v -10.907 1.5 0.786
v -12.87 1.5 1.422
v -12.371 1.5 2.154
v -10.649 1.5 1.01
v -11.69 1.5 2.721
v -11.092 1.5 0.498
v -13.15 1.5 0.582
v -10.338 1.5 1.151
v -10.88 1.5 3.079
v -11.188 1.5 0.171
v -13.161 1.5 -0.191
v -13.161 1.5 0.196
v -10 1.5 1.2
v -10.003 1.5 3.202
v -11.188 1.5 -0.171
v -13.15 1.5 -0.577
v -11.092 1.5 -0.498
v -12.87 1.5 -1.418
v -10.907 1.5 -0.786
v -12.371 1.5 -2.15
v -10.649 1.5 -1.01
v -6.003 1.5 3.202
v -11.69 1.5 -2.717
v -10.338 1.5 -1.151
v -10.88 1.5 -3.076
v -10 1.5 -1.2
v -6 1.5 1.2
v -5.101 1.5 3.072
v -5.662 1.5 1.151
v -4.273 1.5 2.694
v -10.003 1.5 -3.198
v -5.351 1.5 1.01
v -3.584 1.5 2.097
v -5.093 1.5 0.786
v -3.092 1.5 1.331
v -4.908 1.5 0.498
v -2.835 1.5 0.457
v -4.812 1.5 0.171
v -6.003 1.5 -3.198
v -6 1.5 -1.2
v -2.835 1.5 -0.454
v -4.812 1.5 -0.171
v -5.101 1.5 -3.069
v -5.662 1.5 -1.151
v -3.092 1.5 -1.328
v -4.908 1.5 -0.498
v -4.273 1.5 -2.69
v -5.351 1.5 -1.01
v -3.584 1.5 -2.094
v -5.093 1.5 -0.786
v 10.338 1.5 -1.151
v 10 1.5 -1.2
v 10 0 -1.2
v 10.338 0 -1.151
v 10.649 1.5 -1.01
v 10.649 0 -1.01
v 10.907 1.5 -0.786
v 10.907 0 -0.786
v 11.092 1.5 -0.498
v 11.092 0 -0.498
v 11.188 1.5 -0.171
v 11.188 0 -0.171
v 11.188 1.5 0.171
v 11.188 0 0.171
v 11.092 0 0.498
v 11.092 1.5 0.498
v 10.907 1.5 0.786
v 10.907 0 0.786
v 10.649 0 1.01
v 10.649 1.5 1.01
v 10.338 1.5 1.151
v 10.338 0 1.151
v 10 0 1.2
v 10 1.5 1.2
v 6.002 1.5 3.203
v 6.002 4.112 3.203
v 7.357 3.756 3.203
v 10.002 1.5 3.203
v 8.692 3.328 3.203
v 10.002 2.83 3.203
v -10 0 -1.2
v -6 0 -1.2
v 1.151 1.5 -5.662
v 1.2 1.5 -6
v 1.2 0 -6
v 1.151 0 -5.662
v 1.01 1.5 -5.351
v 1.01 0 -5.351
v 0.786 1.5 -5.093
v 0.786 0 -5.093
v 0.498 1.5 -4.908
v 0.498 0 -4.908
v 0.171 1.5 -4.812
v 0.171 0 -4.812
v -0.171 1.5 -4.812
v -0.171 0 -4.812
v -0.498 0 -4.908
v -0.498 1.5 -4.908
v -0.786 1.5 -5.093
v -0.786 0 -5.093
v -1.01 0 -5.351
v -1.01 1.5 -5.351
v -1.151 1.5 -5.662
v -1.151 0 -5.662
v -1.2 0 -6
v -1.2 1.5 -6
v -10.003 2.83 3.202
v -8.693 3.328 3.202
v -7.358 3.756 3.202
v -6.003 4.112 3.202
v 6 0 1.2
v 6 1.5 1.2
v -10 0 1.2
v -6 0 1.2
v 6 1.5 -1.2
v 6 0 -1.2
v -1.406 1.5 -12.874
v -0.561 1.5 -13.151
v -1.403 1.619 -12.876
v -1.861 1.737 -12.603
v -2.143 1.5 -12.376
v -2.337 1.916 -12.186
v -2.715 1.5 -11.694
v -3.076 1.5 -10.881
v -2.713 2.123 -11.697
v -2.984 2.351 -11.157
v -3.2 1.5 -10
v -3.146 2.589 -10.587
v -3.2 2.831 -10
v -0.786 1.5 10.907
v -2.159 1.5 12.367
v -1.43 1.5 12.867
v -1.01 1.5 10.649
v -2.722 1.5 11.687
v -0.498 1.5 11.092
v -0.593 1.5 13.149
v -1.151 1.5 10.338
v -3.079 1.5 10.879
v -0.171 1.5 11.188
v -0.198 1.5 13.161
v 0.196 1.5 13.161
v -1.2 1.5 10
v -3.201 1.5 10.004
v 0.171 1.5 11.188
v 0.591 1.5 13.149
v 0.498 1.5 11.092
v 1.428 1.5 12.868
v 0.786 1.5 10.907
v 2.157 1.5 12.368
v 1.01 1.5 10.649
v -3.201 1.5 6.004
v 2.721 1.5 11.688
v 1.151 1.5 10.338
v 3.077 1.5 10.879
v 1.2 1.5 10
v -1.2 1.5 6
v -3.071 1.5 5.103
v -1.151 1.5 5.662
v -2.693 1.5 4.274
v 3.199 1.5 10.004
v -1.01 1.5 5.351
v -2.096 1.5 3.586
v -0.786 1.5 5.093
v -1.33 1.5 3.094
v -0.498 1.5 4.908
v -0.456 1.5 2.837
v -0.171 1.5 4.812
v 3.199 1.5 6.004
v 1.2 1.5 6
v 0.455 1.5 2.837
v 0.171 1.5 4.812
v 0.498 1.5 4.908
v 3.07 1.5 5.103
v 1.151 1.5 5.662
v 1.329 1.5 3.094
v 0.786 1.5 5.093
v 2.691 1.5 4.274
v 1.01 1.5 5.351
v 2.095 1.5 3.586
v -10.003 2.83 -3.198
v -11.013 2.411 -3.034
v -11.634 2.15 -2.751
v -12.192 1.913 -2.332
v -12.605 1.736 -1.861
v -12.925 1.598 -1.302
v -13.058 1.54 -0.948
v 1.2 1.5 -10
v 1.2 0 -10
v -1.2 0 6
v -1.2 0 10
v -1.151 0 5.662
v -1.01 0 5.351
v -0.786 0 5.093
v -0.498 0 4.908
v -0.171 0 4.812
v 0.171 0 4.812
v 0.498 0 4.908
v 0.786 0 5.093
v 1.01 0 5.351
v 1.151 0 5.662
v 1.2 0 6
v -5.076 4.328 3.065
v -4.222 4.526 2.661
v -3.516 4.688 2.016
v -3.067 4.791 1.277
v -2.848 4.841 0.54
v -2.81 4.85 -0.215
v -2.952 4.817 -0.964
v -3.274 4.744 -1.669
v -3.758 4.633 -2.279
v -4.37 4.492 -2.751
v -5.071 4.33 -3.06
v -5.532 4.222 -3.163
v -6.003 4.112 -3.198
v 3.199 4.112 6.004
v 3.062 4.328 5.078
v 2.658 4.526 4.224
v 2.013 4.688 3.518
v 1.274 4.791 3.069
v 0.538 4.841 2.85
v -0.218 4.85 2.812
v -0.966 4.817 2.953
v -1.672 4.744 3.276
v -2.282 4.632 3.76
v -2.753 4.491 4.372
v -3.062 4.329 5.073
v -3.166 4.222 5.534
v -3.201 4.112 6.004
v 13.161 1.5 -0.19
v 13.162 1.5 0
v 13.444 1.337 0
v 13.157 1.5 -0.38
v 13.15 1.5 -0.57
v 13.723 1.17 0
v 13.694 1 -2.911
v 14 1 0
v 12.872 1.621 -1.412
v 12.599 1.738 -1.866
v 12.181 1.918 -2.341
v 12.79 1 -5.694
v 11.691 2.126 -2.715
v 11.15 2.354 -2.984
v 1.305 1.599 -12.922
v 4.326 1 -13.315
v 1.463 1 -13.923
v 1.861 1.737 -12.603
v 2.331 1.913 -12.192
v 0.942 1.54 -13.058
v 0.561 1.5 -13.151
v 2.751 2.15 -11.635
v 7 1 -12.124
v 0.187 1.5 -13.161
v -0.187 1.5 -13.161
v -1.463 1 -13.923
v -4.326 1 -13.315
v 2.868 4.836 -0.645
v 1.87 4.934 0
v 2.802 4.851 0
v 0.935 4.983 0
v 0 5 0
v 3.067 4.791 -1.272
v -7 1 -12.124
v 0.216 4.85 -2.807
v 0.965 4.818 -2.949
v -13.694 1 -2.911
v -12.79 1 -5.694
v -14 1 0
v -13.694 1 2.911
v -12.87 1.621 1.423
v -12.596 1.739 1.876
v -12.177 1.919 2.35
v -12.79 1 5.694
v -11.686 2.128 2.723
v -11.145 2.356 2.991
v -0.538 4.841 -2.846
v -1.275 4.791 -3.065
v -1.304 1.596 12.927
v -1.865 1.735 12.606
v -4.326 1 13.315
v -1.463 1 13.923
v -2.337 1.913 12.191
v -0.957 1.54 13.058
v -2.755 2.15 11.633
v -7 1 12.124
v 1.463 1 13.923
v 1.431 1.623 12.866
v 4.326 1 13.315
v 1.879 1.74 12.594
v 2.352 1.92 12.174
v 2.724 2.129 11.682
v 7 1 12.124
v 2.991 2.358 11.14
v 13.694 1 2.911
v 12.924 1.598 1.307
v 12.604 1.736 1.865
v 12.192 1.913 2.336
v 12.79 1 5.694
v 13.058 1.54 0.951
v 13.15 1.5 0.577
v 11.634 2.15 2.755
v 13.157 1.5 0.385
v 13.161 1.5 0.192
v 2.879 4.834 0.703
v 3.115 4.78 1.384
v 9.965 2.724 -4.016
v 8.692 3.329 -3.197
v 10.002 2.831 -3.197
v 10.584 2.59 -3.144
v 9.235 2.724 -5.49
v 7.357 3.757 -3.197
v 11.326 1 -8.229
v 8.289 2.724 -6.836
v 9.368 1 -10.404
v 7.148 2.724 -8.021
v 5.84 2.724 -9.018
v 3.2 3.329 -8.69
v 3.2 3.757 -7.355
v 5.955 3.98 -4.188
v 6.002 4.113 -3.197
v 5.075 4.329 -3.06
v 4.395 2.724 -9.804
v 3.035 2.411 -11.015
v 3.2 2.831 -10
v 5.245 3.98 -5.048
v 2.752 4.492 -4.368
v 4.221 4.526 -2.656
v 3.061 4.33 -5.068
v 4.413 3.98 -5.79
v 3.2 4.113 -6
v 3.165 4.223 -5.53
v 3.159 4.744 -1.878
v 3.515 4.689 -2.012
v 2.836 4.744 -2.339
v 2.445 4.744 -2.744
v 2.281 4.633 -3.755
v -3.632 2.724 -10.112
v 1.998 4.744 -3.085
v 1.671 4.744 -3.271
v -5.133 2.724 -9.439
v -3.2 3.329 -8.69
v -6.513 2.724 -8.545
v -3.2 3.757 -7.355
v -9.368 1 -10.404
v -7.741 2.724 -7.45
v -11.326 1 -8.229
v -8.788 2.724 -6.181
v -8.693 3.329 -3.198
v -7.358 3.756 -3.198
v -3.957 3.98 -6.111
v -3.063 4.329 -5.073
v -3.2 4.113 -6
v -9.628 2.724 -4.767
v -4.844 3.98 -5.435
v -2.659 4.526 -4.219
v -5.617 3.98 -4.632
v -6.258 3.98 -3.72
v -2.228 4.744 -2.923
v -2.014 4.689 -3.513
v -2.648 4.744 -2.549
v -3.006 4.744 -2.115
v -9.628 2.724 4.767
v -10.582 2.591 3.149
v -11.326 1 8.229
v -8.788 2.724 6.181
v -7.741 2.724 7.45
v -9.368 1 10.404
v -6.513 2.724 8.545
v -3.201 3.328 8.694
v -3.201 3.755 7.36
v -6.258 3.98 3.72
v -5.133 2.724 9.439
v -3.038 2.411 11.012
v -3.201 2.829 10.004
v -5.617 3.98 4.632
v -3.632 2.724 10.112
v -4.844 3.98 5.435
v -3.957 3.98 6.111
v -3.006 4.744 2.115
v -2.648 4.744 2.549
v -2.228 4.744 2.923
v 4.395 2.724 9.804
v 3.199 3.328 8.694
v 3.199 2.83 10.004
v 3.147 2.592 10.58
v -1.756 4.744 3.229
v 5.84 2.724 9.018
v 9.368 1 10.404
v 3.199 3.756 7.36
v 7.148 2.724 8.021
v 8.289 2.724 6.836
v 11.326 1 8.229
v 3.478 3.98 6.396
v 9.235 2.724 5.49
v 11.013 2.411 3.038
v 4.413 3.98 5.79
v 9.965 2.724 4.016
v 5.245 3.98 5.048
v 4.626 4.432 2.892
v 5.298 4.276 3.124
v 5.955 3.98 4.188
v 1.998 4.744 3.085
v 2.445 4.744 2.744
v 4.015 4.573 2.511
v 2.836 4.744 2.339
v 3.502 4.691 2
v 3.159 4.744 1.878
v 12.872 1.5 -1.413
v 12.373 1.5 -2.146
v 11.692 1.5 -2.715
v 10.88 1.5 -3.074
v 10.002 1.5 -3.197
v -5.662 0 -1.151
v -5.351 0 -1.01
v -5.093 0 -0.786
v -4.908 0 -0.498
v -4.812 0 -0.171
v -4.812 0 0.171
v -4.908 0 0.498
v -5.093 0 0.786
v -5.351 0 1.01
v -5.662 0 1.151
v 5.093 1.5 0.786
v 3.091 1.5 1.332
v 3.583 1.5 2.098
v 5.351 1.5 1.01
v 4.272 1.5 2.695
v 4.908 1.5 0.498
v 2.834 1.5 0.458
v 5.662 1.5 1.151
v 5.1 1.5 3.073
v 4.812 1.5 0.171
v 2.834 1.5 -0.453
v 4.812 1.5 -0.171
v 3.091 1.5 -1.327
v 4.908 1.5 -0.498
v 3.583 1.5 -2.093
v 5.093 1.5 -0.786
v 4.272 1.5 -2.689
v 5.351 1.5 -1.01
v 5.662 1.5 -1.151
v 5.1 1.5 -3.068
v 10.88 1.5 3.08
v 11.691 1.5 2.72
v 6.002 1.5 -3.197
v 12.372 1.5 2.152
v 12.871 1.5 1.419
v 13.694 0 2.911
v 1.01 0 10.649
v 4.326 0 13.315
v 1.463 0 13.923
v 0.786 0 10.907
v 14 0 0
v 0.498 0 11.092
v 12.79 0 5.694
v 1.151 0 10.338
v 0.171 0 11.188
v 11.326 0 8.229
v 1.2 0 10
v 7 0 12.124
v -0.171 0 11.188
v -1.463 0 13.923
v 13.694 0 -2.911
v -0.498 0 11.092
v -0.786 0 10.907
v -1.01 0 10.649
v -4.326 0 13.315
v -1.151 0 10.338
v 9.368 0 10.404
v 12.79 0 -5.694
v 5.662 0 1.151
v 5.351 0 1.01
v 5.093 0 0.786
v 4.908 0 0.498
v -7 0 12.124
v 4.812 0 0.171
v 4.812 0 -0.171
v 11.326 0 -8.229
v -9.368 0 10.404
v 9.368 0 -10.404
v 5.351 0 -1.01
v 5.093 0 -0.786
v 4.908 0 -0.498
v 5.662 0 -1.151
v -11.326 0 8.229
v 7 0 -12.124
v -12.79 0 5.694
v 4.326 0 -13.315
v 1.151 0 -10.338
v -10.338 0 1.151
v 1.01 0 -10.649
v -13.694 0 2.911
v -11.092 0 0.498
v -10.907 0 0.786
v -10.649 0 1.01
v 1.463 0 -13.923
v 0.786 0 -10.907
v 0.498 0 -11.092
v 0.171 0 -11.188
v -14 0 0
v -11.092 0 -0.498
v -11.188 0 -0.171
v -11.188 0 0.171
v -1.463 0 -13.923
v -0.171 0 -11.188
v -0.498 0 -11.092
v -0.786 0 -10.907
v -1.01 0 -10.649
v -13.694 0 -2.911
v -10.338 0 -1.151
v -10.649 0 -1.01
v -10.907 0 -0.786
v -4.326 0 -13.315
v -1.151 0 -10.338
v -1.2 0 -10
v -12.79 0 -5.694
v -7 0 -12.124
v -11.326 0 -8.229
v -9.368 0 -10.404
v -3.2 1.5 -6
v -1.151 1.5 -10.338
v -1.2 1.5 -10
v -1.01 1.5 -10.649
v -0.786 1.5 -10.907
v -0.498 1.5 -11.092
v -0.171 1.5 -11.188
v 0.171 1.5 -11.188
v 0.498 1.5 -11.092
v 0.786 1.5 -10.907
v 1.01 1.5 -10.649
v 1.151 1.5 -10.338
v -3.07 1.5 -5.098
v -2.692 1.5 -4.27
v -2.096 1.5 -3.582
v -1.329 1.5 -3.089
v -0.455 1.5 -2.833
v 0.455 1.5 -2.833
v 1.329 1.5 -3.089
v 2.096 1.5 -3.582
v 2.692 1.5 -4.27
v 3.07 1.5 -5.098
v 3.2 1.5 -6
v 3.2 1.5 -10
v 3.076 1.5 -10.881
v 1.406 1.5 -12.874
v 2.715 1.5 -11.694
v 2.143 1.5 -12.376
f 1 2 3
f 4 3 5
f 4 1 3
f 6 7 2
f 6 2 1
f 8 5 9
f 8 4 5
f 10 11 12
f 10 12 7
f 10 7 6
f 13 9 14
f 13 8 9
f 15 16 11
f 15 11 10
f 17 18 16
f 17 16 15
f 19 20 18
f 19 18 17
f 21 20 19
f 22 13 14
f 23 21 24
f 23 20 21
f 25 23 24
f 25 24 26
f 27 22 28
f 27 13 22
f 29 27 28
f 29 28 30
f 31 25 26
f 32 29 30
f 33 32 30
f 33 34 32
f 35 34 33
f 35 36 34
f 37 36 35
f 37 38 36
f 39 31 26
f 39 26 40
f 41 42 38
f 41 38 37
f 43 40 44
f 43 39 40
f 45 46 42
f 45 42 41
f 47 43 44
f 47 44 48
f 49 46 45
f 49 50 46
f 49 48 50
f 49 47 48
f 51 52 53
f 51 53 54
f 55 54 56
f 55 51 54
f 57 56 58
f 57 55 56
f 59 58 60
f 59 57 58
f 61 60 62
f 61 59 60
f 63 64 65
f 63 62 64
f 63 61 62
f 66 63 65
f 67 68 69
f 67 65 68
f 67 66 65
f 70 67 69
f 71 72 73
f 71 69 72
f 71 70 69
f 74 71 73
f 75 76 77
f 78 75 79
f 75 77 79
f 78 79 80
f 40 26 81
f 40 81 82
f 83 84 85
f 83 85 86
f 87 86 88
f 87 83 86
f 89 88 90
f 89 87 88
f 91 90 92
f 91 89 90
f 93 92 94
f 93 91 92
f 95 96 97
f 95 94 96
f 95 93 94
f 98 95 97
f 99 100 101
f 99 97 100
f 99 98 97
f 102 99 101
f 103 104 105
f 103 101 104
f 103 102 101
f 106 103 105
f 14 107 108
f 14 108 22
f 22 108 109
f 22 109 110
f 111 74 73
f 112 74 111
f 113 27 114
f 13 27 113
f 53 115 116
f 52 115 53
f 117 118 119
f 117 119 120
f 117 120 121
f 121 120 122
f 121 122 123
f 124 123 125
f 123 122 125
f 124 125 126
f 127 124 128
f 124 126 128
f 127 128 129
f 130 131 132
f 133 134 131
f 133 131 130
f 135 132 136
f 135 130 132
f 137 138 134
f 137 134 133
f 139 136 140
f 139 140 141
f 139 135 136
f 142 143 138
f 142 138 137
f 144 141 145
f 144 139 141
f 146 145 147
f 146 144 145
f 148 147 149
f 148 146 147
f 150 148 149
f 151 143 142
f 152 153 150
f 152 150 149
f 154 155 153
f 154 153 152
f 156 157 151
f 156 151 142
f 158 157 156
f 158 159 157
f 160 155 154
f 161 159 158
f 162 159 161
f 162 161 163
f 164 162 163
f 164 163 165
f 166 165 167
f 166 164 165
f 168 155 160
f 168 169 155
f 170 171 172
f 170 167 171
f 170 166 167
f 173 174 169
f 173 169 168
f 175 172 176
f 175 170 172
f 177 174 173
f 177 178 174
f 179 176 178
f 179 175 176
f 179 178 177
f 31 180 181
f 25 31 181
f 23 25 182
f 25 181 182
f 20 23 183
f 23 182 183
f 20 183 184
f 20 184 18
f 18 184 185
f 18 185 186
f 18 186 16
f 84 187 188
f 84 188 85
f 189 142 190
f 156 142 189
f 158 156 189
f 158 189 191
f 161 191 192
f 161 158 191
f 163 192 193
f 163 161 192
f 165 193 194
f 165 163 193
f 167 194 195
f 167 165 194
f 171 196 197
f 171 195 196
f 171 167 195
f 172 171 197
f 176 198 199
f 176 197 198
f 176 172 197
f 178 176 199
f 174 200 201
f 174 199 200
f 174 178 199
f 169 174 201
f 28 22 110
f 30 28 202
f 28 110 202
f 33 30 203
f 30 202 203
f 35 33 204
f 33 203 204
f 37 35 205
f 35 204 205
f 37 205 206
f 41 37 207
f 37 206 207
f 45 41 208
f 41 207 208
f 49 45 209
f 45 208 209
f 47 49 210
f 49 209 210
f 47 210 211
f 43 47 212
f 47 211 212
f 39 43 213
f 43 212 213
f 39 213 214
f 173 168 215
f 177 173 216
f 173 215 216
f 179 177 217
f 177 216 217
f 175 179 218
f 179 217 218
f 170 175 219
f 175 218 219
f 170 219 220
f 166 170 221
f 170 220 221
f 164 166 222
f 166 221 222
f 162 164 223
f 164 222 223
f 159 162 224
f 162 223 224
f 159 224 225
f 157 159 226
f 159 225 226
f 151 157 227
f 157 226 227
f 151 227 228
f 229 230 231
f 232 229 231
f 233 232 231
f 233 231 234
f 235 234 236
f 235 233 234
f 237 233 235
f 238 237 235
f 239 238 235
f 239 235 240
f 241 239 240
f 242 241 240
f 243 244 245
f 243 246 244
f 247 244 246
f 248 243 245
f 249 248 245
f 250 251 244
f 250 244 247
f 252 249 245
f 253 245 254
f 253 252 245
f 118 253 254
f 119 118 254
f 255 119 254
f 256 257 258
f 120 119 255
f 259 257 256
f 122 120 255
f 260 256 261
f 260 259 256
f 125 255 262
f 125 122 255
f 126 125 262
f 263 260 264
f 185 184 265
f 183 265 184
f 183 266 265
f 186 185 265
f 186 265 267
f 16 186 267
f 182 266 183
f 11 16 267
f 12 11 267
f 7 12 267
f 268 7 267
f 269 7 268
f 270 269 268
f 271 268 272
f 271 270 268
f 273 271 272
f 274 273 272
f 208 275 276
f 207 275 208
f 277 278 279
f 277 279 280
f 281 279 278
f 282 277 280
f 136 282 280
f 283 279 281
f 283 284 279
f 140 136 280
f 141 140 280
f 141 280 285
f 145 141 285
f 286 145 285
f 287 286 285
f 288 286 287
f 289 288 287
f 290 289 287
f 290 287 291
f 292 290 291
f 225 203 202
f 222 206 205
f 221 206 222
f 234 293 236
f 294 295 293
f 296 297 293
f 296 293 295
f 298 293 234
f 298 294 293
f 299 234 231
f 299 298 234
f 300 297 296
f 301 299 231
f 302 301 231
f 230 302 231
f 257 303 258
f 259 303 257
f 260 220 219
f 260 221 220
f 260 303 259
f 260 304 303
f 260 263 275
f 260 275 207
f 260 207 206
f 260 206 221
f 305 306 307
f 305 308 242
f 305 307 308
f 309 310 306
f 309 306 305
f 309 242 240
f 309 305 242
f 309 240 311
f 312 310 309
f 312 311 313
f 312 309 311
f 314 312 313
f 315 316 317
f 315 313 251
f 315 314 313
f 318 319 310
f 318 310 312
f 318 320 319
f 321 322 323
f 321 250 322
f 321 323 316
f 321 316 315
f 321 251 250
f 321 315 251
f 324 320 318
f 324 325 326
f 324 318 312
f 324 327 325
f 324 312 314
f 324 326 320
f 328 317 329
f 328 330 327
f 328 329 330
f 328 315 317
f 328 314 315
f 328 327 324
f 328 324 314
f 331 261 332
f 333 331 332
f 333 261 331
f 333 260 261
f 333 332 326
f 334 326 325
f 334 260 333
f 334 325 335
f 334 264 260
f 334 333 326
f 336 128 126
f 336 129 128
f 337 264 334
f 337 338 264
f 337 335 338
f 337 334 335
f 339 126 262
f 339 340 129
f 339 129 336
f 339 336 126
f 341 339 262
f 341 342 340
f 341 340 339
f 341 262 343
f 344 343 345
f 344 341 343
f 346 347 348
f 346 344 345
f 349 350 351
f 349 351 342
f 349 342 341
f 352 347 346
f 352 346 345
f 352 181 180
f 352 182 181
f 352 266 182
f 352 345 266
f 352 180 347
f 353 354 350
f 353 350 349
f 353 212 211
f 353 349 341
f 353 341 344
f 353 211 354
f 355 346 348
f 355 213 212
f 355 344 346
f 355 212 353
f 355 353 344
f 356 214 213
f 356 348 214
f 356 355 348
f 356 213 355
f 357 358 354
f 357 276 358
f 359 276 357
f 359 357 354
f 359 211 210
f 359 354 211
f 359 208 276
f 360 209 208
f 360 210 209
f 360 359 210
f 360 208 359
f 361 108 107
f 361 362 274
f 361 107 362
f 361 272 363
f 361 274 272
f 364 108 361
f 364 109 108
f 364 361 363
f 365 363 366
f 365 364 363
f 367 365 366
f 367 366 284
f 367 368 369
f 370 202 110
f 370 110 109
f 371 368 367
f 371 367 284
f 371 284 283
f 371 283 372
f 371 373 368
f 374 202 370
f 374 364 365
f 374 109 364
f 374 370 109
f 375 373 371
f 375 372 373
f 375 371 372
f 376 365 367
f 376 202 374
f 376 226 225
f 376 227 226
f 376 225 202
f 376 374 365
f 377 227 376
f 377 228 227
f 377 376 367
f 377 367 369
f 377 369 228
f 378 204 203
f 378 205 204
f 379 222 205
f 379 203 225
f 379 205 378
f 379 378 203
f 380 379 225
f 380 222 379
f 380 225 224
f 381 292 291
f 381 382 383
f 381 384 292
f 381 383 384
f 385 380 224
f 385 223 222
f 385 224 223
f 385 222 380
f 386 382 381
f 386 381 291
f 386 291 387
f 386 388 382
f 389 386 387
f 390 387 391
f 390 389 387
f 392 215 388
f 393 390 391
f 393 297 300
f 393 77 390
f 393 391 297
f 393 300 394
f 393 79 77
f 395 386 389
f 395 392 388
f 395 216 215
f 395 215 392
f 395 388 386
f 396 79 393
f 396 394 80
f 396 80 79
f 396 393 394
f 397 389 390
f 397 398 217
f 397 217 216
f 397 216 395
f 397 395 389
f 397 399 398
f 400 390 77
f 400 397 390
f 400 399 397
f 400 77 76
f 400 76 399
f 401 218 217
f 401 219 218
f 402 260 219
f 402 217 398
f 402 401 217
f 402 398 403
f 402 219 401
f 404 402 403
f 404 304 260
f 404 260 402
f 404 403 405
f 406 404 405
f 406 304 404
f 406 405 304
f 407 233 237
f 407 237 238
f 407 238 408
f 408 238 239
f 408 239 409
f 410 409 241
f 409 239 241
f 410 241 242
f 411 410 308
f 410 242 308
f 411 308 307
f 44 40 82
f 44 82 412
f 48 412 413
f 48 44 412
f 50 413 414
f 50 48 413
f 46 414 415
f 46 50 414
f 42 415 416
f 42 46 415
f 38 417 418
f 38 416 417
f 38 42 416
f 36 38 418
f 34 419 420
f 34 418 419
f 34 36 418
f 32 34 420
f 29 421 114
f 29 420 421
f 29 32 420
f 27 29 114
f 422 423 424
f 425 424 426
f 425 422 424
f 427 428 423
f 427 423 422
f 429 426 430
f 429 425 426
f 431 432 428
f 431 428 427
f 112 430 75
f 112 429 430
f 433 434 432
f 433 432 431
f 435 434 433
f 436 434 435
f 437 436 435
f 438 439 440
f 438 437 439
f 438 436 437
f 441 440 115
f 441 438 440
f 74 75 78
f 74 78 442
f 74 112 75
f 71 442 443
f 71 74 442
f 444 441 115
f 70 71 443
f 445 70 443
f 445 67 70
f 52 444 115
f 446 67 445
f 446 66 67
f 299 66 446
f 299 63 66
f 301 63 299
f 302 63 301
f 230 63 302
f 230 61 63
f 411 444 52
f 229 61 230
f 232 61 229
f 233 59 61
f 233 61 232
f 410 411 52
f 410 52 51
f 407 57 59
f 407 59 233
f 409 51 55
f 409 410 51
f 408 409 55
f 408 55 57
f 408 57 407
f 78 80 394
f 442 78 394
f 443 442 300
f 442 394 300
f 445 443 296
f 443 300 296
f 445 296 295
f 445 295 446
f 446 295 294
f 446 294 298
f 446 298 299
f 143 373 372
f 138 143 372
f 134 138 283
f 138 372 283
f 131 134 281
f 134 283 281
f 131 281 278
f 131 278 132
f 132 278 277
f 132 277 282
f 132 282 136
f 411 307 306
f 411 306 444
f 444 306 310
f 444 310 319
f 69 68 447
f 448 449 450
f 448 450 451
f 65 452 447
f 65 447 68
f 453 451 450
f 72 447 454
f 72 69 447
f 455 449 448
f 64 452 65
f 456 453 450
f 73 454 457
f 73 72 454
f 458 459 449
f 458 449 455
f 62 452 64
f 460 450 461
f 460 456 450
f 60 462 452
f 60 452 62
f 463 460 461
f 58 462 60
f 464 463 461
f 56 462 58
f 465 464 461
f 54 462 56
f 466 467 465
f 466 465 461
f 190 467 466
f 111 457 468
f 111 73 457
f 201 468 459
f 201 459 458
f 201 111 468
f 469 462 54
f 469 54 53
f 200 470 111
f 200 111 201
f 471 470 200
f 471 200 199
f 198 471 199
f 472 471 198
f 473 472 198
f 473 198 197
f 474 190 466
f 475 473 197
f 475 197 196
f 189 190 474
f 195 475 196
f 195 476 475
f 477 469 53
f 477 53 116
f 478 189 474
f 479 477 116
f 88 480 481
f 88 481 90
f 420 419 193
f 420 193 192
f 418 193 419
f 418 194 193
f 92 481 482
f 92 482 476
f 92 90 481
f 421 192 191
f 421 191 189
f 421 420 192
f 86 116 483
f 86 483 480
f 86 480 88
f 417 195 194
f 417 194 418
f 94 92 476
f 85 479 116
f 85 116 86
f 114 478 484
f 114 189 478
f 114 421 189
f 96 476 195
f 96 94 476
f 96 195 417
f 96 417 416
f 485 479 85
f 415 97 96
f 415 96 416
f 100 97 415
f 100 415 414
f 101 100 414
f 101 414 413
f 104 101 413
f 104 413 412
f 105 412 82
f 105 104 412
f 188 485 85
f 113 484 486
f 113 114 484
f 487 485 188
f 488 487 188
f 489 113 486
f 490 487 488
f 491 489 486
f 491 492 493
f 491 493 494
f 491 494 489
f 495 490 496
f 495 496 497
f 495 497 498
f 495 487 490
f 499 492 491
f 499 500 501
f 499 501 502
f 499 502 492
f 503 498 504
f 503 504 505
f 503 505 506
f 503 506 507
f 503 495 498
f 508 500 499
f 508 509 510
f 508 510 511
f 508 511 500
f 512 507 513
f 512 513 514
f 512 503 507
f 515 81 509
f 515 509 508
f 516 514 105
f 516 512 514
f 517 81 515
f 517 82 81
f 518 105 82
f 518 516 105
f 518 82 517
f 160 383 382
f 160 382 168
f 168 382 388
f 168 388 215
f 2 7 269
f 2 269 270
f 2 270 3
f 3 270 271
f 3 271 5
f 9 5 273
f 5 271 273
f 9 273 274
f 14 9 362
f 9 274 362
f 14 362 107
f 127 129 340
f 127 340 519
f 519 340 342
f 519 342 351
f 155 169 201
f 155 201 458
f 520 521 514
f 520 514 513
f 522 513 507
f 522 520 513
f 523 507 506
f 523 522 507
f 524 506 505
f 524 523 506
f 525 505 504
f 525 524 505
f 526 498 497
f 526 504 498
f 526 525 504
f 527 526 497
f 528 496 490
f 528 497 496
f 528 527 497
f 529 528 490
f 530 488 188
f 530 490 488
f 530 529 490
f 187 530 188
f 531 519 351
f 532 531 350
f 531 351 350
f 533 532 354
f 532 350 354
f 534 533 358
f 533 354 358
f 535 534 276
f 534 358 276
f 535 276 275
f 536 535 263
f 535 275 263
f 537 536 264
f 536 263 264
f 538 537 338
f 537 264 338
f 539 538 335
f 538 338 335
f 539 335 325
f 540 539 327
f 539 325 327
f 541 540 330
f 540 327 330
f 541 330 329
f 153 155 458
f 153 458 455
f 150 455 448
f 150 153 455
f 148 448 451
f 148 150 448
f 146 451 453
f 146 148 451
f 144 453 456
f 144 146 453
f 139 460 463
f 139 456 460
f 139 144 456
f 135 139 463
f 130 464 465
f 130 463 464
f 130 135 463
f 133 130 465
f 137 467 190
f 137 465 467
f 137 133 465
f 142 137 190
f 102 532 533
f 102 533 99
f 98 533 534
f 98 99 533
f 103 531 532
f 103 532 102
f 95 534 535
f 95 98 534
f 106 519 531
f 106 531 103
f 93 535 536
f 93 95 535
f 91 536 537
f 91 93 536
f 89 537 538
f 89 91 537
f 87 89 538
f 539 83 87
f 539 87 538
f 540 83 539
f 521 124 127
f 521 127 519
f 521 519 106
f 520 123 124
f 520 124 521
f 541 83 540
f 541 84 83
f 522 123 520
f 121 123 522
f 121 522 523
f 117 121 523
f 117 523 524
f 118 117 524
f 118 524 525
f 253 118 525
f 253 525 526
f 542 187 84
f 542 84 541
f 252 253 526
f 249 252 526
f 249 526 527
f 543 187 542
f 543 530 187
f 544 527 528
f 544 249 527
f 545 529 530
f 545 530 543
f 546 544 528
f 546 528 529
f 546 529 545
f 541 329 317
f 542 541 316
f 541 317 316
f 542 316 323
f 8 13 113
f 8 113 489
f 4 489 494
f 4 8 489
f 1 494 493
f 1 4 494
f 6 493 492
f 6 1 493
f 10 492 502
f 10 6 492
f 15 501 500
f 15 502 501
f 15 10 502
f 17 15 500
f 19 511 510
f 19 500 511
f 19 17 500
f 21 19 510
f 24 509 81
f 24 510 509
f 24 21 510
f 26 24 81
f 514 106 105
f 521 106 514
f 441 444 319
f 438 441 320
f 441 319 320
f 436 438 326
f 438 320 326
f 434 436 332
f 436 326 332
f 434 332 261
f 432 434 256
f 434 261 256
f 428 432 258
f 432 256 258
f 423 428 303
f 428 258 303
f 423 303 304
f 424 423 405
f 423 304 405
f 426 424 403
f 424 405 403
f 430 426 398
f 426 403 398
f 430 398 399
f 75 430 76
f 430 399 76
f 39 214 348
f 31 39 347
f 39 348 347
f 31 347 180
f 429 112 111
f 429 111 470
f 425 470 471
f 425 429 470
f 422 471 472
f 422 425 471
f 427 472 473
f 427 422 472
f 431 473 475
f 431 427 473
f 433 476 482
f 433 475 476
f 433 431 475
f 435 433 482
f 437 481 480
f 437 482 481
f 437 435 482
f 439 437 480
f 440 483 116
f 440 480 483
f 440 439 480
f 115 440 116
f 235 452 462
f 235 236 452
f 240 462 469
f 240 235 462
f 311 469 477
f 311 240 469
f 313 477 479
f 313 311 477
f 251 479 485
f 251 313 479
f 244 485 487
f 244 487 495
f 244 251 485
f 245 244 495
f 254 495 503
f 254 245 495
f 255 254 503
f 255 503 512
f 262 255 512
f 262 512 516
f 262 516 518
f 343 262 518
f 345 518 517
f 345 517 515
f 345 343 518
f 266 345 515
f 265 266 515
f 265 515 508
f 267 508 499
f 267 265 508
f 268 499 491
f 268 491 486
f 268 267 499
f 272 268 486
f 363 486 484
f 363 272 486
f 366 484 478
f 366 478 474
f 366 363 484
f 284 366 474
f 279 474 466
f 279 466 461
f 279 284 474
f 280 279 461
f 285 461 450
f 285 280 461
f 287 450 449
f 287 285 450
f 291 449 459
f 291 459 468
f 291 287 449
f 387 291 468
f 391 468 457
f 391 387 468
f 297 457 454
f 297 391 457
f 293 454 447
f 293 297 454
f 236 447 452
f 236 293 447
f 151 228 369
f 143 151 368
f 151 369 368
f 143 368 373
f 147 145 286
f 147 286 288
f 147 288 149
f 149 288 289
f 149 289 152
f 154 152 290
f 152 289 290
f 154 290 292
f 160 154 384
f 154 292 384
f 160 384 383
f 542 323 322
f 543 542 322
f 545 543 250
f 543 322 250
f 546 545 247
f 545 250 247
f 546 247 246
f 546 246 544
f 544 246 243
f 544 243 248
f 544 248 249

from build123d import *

# Parameters (mm, degrees)
CUT_EXTRUDE1_DEPTH = 21.420577857
CUT_EXTRUDE2_DEPTH = 3.5


with BuildPart() as part:
    # Sketch1 → Revolve1 (revolve)
    with BuildSketch(Plane.XY, mode=Mode.PRIVATE) as revolve1_sk:
        with BuildLine():
            Line((0, 0), (-14, 0))
            Line((-14, 0), (-14, 1))
            ThreePointArc((-14, 1), (-7.280109889, 3.980384612), (0, 5))
            Line((0, 5), (0, 0))
        make_face()
    revolve(revolve1_sk.sketch.rotate(Axis((0, 0, 0), (0, 1, 0)), 180), axis=Axis((0, 0, 0), (0, 1, 0)))

    # Sketch2 → Cut-Extrude1 (cut, through all)
    with BuildSketch(Plane(origin=(0, 5, 0), x_dir=(1, 0, 0), z_dir=(0, 1, 0))):
        with BuildLine():
            Line((1.2, 10), (1.2, 6))
            ThreePointArc((1.2, 6), (0, 4.8), (-1.2, 6))
            Line((-1.2, 6), (-1.2, 10))
            ThreePointArc((-1.2, 10), (0, 11.2), (1.2, 10))
        make_face()
        with BuildLine():
            Line((10, -1.2), (6, -1.2))
            ThreePointArc((6, -1.2), (4.8, 0), (6, 1.2))
            Line((6, 1.2), (10, 1.2))
            ThreePointArc((10, 1.2), (11.2, 0), (10, -1.2))
        make_face()
        with BuildLine():
            Line((-1.2, -10), (-1.2, -6))
            ThreePointArc((-1.2, -6), (0, -4.8), (1.2, -6))
            Line((1.2, -6), (1.2, -10))
            ThreePointArc((1.2, -10), (0, -11.2), (-1.2, -10))
        make_face()
        with BuildLine():
            Line((-10, 1.2), (-6, 1.2))
            ThreePointArc((-6, 1.2), (-4.8, 0), (-6, -1.2))
            Line((-6, -1.2), (-10, -1.2))
            ThreePointArc((-10, -1.2), (-11.2, 0), (-10, 1.2))
        make_face()
    extrude(amount=-CUT_EXTRUDE1_DEPTH, mode=Mode.SUBTRACT)

    # Sketch3 → Cut-Extrude2 (cut)
    with BuildSketch(Plane(origin=(0, 5, 0), x_dir=(1, 0, 0), z_dir=(0, 1, 0))):
        with BuildLine():
            Line((10.001792972, 3.197433741), (6.001792972, 3.197433741))
            ThreePointArc((6.001792972, 3.197433741), (2.801792972, -0.002566259), (6.001792972, -3.202566259))
            Line((6.001792972, -3.202566259), (10.001792972, -3.202566259))
            ThreePointArc((10.001792972, -3.202566259), (13.201792972, -0.002566259), (10.001792972, 3.197433741))
        make_face()
        with BuildLine():
            Line((3.2, 6), (3.2, 10))
            ThreePointArc((3.2, 10), (0, 13.2), (-3.2, 10))
            Line((-3.2, 10), (-3.2, 6))
            ThreePointArc((-3.2, 6), (0, 2.8), (3.2, 6))
        make_face()
        with BuildLine():
            Line((3.199226713, -10.004359231), (3.199226713, -6.004359231))
            ThreePointArc((3.199226713, -6.004359231), (-0.000773287, -2.804359231), (-3.200773287, -6.004359231))
            Line((-3.200773287, -6.004359231), (-3.200773287, -10.004359231))
            ThreePointArc((-3.200773287, -10.004359231), (-0.000773287, -13.204359231), (3.199226713, -10.004359231))
        make_face()
        with BuildLine():
            Line((-10.002566259, -3.201792972), (-6.002566259, -3.201792972))
            ThreePointArc((-6.002566259, -3.201792972), (-2.802566259, -0.001792972), (-6.002566259, 3.198207028))
            Line((-6.002566259, 3.198207028), (-10.002566259, 3.198207028))
            ThreePointArc((-10.002566259, 3.198207028), (-13.202566259, -0.001792972), (-10.002566259, -3.201792972))
        make_face()
    extrude(amount=-CUT_EXTRUDE2_DEPTH, mode=Mode.SUBTRACT)


solid = part.part
